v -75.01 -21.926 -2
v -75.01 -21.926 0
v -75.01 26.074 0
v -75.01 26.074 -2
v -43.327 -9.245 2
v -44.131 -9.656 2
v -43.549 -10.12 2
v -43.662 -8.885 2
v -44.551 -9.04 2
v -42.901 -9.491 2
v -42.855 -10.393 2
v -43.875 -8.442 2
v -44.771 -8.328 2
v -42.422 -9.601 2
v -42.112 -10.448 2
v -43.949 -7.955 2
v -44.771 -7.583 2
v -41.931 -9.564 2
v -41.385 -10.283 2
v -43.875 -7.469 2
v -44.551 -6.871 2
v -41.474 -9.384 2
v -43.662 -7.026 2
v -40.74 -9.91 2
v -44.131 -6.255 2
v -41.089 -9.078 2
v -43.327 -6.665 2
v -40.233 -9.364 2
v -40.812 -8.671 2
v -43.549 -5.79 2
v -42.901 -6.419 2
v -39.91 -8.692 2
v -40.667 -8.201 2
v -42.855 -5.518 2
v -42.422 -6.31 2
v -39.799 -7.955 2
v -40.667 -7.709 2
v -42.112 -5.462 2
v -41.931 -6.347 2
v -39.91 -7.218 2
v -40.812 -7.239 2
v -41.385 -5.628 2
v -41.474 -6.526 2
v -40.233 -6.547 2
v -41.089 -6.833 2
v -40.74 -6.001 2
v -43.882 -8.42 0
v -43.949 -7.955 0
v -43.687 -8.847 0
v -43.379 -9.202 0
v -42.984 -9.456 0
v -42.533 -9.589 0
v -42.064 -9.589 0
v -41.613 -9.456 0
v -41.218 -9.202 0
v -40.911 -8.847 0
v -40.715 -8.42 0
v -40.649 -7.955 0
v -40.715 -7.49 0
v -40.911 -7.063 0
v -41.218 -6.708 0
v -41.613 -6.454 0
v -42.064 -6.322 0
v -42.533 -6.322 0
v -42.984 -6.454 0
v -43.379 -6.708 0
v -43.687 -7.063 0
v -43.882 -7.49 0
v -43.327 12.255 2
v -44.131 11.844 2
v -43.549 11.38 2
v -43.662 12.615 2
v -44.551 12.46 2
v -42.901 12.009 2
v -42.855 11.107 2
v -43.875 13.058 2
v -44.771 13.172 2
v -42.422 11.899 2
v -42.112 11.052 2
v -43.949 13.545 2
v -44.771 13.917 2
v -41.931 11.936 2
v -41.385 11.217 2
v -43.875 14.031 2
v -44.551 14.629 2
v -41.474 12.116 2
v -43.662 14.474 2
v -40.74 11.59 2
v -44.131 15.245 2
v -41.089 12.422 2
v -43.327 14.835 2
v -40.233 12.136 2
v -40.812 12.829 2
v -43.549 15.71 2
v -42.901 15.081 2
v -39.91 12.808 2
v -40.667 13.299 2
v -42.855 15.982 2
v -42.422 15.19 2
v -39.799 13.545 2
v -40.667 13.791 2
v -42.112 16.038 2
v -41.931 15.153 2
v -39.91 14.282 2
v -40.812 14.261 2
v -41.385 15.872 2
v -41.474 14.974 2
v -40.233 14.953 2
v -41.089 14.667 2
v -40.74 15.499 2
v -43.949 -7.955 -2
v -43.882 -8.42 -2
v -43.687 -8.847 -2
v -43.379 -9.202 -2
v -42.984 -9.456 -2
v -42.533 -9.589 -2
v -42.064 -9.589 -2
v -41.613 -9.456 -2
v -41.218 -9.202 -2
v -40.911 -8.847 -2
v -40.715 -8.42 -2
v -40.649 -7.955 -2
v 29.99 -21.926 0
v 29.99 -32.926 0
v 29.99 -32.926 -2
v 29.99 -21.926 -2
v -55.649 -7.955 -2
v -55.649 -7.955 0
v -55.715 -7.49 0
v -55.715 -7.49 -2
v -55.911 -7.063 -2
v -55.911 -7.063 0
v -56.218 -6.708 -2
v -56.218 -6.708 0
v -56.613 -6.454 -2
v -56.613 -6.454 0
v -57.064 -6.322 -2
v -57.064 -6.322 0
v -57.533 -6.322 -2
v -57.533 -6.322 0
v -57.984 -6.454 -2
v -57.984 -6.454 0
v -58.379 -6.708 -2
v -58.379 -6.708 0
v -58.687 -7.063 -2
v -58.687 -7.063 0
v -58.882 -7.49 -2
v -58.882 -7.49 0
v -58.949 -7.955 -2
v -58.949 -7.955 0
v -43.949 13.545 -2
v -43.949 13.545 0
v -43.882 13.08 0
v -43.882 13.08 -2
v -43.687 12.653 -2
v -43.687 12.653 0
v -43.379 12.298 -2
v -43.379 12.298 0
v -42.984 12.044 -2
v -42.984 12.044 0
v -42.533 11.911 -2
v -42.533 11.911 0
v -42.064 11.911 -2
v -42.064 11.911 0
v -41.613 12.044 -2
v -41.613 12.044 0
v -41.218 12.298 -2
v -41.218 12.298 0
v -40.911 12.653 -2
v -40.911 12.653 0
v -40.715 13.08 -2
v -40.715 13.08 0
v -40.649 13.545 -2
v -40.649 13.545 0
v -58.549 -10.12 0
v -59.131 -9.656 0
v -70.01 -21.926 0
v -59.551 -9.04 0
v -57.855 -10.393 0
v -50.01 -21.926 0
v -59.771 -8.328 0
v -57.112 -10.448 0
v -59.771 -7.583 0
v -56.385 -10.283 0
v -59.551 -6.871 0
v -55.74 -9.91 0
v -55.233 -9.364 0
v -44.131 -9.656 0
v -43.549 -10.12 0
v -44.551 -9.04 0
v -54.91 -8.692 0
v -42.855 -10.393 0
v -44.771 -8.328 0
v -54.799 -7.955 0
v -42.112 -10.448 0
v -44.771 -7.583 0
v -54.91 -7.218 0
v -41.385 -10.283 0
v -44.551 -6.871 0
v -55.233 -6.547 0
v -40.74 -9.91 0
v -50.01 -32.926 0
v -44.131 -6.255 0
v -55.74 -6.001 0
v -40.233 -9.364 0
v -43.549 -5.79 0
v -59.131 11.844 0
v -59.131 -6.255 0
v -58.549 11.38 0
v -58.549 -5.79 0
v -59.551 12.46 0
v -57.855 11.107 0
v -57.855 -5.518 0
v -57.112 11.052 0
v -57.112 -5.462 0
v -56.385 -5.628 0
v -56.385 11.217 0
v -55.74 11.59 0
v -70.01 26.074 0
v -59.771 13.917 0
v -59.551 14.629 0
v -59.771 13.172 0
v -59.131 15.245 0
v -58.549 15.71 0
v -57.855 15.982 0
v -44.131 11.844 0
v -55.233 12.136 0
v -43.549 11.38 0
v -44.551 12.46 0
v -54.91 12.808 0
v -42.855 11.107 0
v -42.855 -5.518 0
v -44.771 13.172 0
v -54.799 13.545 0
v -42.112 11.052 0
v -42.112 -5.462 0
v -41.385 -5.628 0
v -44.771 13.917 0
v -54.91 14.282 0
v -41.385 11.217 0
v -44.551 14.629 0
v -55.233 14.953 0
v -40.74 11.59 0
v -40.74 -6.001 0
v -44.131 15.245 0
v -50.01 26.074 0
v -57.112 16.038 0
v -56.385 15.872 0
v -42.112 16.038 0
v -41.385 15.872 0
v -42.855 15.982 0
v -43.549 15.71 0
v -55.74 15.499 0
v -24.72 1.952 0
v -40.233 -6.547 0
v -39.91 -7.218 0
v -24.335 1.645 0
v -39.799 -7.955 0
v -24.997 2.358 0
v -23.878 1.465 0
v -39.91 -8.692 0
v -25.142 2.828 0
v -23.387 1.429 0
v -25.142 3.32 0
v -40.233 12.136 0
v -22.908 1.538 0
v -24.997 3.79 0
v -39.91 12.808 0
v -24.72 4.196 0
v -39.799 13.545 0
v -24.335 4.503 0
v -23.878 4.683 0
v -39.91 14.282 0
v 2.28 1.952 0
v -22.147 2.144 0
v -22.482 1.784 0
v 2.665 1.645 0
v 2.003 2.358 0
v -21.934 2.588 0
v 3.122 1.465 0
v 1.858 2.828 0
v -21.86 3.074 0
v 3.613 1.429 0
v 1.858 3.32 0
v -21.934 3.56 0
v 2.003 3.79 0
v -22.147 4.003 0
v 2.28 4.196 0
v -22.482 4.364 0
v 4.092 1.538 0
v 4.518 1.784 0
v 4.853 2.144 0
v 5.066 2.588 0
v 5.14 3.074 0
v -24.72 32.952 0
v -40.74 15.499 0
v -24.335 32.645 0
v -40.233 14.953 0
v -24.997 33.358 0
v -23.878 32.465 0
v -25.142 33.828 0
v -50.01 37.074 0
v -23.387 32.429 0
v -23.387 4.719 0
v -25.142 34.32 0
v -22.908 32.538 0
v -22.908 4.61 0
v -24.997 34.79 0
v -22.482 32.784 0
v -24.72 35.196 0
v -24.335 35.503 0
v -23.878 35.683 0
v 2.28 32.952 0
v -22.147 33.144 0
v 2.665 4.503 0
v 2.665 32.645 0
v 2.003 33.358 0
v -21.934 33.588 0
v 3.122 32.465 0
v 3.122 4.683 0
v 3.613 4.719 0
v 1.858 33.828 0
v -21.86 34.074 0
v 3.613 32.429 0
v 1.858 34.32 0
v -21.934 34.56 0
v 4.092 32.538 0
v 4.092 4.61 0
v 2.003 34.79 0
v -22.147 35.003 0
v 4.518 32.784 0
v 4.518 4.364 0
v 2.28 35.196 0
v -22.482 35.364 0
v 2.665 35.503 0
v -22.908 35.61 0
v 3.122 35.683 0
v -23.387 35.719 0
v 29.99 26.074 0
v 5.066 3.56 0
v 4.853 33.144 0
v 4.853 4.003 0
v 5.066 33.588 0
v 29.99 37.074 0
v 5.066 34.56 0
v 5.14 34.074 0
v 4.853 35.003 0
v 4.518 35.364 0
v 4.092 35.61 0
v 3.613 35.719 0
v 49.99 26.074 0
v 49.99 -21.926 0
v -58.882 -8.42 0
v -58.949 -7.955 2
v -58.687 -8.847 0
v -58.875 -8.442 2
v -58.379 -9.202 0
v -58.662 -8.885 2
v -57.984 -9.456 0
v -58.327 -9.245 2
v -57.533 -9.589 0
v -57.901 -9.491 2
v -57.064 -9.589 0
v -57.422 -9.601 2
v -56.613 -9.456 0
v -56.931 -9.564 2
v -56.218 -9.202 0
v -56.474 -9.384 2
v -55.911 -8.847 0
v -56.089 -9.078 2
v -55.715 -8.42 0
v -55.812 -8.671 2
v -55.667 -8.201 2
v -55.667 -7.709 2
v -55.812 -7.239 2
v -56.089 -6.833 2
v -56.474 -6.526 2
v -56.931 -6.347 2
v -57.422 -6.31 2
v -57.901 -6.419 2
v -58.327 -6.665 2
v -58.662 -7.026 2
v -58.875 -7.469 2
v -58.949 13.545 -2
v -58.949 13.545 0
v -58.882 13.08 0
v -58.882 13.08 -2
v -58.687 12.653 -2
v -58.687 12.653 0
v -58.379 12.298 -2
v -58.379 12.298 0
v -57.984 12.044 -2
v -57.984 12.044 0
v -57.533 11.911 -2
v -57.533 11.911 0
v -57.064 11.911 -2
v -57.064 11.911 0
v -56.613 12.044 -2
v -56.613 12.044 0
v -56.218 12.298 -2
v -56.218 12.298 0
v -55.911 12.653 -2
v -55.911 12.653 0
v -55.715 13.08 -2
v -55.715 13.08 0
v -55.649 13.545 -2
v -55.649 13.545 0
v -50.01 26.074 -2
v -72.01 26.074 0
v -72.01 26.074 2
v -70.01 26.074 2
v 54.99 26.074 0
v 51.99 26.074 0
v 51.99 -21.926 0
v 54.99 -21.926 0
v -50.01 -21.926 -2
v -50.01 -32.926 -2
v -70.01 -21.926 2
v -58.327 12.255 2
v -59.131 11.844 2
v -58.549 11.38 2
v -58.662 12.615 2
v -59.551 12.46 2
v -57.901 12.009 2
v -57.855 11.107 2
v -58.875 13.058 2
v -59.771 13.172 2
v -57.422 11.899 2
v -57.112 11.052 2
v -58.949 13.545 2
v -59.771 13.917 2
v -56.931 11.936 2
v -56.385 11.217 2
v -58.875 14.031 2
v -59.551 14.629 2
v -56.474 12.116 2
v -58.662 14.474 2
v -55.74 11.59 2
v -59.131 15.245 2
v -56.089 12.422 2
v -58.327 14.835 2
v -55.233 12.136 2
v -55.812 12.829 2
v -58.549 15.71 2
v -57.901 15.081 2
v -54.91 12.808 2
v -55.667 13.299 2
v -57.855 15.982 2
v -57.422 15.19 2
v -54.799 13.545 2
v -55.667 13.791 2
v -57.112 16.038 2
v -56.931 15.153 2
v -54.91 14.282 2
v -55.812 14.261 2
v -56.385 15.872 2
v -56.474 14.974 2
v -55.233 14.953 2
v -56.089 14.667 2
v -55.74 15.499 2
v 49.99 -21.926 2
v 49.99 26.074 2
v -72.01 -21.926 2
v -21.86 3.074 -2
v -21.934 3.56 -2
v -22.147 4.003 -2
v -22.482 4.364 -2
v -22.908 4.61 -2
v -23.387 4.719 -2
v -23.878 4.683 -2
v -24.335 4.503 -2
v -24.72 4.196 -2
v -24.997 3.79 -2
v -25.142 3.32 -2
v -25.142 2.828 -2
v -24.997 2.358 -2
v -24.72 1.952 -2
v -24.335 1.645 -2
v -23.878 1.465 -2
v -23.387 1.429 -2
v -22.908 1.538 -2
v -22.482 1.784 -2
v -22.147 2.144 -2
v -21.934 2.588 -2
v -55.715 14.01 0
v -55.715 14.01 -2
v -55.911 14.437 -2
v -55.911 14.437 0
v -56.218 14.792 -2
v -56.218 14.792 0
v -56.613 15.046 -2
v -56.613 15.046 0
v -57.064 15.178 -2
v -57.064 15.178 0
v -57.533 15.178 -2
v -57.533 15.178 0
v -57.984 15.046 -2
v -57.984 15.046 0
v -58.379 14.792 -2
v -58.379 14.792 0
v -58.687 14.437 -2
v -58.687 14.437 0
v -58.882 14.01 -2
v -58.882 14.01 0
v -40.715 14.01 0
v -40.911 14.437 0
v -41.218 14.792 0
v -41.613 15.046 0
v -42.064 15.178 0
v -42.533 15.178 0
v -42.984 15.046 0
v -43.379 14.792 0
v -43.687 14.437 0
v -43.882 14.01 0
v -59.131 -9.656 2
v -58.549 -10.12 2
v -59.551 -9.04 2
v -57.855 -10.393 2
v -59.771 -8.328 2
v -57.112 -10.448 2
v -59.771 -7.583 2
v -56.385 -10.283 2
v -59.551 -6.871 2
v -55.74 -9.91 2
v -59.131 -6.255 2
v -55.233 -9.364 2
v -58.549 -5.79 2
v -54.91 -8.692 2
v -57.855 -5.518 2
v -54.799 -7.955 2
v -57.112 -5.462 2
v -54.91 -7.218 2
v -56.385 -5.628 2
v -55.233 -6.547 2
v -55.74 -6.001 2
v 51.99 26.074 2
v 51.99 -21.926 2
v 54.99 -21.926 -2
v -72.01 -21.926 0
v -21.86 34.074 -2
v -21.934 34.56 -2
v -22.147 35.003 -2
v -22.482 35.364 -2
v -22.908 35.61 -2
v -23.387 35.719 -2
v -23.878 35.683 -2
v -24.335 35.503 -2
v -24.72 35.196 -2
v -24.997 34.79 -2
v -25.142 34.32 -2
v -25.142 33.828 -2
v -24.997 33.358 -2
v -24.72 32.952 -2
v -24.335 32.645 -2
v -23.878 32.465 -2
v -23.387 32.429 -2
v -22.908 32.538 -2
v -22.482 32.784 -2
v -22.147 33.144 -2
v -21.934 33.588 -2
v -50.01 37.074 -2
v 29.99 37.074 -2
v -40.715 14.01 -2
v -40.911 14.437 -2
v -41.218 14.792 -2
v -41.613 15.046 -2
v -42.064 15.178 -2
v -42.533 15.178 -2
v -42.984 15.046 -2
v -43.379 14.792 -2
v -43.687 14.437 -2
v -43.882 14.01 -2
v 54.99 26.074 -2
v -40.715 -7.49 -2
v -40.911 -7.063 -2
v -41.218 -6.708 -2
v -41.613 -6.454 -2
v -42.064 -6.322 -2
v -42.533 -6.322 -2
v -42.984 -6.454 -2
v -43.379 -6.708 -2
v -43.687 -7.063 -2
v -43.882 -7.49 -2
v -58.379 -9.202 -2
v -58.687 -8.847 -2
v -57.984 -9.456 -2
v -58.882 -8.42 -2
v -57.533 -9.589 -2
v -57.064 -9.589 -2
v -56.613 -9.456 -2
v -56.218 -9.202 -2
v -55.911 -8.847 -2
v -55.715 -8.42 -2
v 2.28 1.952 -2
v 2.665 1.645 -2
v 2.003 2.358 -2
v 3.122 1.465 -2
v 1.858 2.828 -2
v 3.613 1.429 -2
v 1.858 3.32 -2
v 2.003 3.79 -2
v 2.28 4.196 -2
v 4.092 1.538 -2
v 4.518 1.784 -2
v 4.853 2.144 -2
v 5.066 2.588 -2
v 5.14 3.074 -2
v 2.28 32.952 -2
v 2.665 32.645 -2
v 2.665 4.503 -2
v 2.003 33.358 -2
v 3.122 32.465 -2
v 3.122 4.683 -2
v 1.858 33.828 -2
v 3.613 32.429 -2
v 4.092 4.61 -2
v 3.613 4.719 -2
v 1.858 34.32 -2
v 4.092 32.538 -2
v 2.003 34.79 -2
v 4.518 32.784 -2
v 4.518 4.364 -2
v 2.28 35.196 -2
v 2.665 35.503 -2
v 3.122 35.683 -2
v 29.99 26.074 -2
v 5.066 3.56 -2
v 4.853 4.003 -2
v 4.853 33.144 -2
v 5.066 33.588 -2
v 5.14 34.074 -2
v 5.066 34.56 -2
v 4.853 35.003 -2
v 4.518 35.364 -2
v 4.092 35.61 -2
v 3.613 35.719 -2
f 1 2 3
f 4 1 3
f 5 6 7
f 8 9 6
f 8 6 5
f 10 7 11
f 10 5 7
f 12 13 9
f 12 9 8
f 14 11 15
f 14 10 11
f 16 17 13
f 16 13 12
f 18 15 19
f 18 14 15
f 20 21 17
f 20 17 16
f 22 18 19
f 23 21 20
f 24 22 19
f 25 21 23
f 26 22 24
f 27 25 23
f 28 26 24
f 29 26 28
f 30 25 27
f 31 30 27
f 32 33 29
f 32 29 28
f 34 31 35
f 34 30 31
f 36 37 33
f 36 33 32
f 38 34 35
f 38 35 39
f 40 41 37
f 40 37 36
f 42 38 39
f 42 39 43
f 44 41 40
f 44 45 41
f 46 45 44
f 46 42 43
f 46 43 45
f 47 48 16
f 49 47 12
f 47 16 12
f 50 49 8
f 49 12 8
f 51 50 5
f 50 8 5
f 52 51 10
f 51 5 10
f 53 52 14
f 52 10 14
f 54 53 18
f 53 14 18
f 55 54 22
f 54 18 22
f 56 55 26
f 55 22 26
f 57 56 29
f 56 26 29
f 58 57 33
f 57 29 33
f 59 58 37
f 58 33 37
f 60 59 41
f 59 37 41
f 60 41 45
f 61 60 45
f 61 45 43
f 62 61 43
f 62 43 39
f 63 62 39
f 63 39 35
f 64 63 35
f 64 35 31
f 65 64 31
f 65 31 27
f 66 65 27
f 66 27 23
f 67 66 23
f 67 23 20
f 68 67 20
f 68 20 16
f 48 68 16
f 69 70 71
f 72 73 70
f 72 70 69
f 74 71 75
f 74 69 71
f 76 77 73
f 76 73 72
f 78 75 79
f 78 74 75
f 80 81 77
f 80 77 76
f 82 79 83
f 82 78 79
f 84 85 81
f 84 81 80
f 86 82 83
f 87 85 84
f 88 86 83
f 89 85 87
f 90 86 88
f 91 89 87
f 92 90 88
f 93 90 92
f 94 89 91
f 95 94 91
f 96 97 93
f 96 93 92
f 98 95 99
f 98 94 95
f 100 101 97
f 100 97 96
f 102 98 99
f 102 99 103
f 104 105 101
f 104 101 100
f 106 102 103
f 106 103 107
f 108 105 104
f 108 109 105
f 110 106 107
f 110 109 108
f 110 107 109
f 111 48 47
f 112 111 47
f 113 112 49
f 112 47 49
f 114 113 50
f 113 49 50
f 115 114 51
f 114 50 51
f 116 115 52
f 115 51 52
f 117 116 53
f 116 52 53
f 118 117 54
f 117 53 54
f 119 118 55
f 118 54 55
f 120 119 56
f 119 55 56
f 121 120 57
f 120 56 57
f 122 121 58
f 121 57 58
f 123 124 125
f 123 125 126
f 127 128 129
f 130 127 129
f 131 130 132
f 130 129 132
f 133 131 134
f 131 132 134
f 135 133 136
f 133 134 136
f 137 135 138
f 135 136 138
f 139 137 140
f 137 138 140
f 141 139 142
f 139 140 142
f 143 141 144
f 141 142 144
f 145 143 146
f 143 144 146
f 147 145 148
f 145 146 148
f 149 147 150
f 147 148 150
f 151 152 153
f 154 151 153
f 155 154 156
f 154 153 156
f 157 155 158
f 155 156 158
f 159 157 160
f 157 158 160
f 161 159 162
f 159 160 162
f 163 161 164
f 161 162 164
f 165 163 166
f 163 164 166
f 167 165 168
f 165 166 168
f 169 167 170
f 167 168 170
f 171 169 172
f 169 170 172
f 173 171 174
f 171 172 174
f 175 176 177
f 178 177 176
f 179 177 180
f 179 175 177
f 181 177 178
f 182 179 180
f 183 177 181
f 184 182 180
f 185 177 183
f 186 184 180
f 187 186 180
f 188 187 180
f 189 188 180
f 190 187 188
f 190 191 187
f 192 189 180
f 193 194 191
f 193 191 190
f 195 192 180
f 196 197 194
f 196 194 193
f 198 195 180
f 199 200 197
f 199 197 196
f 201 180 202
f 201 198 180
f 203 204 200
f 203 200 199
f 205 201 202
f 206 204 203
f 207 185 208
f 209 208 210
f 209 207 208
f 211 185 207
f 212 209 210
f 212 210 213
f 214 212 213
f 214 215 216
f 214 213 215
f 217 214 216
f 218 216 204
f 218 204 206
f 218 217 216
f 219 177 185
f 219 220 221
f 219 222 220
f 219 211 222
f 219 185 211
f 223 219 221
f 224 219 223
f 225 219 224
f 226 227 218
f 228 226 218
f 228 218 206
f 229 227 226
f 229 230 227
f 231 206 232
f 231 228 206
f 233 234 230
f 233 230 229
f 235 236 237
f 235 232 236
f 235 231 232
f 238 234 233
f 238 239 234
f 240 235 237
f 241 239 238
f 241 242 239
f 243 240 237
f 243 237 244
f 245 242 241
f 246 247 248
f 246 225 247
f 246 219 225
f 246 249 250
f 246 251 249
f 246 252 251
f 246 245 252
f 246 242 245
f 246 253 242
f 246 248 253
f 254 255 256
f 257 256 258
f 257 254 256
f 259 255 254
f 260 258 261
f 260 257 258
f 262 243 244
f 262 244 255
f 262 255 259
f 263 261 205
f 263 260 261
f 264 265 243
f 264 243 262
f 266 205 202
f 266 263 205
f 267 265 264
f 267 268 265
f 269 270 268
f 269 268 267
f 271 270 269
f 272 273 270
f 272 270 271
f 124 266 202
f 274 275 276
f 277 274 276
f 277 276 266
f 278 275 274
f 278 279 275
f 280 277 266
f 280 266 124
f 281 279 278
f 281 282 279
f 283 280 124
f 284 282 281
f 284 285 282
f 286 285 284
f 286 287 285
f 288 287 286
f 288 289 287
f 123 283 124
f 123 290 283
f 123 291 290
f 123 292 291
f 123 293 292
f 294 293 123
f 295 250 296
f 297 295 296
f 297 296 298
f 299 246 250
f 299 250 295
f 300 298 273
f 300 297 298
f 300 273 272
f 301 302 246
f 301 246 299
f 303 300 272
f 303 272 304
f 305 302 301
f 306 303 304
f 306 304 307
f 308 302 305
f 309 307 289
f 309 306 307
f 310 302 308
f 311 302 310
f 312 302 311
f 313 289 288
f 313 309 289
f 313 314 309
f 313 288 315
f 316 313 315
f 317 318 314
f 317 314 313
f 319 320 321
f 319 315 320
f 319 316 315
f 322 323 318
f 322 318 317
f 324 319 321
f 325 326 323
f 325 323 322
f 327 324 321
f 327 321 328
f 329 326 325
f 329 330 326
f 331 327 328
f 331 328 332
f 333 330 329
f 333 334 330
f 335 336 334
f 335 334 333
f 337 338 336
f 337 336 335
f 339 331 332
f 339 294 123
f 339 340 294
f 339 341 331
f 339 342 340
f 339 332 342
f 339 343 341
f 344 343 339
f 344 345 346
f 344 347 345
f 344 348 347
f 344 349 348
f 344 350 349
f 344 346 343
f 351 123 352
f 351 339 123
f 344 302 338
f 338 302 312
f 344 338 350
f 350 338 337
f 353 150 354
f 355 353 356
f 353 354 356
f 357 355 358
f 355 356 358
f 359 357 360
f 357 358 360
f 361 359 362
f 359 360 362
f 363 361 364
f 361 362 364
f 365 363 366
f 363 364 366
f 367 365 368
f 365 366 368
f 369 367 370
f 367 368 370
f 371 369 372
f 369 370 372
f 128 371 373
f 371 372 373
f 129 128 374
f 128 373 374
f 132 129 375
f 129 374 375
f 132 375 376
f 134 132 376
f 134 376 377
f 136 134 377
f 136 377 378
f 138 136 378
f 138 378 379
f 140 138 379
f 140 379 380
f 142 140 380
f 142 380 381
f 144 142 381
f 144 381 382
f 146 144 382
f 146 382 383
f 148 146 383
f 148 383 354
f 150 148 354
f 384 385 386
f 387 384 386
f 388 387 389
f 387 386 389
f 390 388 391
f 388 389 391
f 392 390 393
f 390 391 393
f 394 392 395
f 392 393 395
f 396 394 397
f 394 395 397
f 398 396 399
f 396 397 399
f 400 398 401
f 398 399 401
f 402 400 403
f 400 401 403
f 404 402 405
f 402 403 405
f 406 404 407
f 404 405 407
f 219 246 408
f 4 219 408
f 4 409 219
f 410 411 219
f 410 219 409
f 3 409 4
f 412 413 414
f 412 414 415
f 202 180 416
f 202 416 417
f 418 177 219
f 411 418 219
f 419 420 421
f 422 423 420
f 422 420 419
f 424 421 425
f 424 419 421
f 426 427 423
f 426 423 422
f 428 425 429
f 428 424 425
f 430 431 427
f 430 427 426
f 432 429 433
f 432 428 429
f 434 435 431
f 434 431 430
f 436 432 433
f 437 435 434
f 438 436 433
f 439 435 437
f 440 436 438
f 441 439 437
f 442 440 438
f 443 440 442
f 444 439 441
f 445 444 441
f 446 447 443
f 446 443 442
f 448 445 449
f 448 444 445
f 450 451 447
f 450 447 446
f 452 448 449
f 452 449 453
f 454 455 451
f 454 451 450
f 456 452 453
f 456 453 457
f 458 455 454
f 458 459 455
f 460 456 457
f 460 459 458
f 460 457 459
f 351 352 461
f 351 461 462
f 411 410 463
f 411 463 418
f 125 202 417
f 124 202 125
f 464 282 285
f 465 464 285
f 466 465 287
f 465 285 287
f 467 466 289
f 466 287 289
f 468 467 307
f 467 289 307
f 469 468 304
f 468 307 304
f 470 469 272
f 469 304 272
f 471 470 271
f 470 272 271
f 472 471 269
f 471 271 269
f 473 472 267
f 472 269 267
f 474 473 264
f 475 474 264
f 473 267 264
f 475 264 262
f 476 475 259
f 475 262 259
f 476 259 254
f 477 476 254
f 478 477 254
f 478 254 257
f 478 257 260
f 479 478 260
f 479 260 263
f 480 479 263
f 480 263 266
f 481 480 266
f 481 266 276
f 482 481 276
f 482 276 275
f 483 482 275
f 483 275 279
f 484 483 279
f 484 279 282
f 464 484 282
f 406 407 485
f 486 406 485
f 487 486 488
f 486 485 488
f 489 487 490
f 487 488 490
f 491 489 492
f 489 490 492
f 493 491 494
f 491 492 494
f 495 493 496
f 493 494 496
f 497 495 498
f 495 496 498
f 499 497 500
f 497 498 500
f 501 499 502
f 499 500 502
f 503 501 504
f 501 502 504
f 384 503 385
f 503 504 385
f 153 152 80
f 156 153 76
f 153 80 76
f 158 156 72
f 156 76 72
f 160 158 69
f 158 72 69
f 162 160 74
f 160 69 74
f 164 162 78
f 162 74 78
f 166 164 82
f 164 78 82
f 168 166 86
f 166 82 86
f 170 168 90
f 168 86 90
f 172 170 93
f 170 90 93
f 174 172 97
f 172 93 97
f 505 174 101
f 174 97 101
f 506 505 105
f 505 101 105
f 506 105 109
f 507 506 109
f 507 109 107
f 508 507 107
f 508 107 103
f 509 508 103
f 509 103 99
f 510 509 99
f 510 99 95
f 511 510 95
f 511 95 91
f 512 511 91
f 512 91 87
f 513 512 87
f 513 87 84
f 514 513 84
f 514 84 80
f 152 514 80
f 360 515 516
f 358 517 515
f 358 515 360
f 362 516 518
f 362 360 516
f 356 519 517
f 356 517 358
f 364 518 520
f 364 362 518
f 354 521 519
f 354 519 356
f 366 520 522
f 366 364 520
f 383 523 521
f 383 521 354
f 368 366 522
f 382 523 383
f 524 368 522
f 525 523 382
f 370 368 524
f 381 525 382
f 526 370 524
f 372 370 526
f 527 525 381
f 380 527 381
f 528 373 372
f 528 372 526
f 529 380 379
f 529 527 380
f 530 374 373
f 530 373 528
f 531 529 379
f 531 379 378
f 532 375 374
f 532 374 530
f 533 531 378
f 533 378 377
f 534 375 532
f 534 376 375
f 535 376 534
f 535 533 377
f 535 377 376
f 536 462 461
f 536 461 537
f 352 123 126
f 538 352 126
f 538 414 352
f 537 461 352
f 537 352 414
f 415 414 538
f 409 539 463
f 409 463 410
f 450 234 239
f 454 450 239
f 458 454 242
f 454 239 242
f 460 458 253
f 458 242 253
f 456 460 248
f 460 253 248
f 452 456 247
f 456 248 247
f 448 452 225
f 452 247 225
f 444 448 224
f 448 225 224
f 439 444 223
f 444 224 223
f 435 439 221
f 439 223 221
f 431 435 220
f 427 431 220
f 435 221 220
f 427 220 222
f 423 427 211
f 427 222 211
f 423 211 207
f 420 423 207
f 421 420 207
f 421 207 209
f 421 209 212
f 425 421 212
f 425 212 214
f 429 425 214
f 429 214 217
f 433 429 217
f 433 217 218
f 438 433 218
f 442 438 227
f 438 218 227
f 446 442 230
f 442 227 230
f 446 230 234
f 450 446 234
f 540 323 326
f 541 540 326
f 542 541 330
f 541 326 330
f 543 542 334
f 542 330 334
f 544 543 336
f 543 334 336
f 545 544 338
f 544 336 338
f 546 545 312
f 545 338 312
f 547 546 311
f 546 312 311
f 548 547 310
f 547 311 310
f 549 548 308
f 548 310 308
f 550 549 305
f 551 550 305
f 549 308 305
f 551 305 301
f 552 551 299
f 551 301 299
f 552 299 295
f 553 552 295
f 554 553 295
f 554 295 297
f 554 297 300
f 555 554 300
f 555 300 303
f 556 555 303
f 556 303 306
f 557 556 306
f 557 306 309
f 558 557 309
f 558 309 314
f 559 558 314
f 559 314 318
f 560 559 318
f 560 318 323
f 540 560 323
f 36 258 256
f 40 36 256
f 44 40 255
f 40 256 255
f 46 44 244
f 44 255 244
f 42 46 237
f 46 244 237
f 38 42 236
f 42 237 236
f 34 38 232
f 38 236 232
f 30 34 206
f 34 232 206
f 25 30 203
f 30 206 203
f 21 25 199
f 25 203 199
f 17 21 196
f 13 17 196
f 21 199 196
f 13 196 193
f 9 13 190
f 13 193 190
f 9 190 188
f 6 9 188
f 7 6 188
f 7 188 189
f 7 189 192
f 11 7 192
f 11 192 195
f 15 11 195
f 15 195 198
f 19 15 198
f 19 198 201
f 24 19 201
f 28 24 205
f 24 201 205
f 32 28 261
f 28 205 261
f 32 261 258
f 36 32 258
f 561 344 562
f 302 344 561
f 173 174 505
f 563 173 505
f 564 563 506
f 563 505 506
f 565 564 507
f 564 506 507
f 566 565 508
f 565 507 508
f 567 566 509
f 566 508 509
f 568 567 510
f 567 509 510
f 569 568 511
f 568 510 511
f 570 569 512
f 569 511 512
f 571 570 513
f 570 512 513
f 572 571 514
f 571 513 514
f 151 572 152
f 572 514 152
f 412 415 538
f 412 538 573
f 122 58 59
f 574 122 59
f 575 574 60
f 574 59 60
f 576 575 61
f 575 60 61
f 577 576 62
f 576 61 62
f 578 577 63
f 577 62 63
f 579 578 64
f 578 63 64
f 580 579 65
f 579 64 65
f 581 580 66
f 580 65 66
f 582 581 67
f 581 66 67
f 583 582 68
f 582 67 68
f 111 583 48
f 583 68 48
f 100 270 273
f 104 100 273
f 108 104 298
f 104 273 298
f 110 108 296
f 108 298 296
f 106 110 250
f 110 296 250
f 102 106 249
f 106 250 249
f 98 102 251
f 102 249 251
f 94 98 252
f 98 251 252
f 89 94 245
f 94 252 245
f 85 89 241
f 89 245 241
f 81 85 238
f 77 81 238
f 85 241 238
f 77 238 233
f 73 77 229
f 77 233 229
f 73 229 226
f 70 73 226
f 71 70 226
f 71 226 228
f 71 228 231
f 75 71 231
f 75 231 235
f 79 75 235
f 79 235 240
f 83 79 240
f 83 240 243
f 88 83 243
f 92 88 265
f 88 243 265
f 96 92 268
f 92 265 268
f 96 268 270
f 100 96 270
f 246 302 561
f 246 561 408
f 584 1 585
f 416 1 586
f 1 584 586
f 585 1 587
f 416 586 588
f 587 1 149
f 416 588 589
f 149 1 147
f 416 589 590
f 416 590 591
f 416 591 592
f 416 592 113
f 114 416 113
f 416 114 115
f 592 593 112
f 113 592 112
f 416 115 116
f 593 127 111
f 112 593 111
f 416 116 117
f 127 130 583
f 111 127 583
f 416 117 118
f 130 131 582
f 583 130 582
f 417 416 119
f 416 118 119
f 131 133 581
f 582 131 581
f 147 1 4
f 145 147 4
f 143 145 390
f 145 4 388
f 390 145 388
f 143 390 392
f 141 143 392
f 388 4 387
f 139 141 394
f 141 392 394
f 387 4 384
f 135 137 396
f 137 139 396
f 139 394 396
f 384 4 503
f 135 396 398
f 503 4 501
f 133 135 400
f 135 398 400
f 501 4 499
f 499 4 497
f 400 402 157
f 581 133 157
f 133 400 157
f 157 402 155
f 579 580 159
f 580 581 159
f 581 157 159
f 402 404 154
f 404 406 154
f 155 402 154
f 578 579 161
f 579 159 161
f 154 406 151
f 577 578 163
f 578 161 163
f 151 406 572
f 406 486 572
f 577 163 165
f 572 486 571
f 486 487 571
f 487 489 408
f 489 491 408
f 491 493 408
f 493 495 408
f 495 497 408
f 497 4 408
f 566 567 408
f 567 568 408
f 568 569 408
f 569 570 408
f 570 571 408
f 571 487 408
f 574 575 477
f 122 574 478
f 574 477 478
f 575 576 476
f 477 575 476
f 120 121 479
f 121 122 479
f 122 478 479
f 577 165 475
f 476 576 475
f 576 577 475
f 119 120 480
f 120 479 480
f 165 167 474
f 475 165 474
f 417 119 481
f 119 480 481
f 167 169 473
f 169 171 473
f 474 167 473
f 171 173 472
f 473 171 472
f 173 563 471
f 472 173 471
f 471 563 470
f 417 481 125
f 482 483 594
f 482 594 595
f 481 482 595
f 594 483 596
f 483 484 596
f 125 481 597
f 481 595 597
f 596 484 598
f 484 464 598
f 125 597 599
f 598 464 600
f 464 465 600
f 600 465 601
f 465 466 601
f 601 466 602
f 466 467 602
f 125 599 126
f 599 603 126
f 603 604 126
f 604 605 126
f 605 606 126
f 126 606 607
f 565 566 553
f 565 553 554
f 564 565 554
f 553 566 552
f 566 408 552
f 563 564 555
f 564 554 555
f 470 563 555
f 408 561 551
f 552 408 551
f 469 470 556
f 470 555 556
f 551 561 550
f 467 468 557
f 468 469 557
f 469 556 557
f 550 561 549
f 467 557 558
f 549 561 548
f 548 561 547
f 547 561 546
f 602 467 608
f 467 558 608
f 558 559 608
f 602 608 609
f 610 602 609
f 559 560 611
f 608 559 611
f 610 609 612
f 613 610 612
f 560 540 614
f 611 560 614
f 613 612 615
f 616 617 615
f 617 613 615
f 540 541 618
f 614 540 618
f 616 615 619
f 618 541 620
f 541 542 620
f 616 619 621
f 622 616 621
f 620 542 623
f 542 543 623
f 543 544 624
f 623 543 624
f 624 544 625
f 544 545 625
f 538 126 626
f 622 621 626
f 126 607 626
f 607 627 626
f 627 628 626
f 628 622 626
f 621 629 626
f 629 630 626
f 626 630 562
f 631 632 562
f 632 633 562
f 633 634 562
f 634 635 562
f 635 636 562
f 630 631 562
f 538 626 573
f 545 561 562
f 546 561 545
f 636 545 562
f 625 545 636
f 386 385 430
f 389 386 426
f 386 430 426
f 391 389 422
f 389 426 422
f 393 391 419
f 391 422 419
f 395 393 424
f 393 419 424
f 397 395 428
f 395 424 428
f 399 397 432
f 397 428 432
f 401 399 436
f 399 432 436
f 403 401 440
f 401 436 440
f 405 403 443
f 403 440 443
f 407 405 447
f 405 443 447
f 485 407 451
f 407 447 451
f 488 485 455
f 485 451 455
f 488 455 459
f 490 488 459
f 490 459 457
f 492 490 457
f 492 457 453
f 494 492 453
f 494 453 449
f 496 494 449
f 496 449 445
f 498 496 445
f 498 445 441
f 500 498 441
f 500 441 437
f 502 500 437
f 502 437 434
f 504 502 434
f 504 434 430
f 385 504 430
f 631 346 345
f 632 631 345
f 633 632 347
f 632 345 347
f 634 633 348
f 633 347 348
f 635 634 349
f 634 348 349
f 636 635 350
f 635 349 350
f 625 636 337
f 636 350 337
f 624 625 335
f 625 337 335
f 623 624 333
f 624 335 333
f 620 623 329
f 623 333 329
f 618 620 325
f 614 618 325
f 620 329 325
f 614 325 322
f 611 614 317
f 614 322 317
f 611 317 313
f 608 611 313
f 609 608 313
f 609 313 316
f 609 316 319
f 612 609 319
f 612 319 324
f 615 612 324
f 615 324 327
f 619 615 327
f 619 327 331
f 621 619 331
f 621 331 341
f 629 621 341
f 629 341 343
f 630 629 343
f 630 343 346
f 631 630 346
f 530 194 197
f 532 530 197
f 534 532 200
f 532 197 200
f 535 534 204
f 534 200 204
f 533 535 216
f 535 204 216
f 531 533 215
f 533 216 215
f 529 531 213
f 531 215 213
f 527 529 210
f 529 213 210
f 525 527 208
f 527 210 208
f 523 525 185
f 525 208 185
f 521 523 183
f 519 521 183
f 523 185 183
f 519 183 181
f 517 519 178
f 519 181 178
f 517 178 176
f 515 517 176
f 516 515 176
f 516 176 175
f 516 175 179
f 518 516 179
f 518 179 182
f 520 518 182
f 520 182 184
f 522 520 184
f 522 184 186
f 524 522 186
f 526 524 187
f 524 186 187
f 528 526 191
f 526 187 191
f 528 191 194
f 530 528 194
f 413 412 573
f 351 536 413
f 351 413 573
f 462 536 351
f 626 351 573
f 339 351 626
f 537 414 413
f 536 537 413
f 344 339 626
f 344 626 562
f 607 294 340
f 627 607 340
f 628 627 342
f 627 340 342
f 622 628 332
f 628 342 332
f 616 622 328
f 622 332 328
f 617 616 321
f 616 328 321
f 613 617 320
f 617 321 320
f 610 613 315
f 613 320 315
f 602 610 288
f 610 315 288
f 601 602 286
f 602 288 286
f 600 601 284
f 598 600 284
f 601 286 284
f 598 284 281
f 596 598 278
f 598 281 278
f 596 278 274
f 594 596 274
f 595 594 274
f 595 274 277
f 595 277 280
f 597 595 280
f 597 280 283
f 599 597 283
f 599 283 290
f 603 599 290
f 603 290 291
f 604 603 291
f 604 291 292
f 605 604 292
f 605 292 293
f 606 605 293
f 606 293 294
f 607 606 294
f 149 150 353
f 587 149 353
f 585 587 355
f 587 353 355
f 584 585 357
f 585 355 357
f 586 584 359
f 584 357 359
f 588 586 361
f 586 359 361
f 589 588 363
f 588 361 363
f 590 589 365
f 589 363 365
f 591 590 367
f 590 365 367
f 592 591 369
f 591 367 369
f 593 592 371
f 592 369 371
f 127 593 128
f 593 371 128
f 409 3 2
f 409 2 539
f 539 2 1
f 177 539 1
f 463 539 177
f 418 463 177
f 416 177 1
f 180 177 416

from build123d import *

# Parameters (mm, degrees)
F0_R     = 2.5
F0_W     = 20
F0_H     = 48
F0_W_2   = 3
F0_W_3   = 2
F1_DEPTH = 2
F2_DEPTH = 2
F3_D     = 3.3
F3_DEPTH = 2.001
F4_D     = 3.3


# Not quite as in the source:
# - a feature names something its author has since deleted; it is built from what else it names


with BuildPart() as f1:
    # F0 (on Top) → F1 (new body)
    with BuildSketch(Plane.XY):
        Polygon((-17.7864517868, 26.073888598), (-50.0104304813, 26.073888598), (-50.0104304813, -21.926111402), (-17.7864517868, -21.926111402), (19.2135482132, -21.926111402), (29.9895695187, -21.926111402), (29.9895695187, 26.073888598), (19.2135482132, 26.073888598), align=None)
        with Locations((-42.2986224294, -7.9553306252)):
            Circle(F0_R, mode=Mode.SUBTRACT)
        with Locations((-42.2986224294, 13.5446693748)):
            Circle(F0_R, mode=Mode.SUBTRACT)
        Polygon((-50.0104304813, -21.926111402), (-50.0104304813, 26.073888598), (-54.2864517868, 26.073888598), (-70.0104304813, 26.073888598), (-70.0104304813, -21.926111402), (-54.2864517868, -21.926111402), align=None)
        with Locations((-57.2986224294, -7.9553306252)):
            Circle(F0_R, mode=Mode.SUBTRACT)
        with Locations((-57.2986224294, 13.5446693748)):
            Circle(F0_R, mode=Mode.SUBTRACT)
        with Locations((39.9895695187, 2.073888598)):
            Rectangle(F0_W, F0_H)
        Polygon((29.9895695187, 37.073888598), (-50.0104304813, 37.073888598), (-50.0104304813, 26.073888598), (-17.7864517868, 26.073888598), (19.2135482132, 26.073888598), (29.9895695187, 26.073888598), align=None)
        Polygon((-17.7864517868, -21.926111402), (-50.0104304813, -21.926111402), (-50.0104304813, -32.926111402), (29.9895695187, -32.926111402), (29.9895695187, -21.926111402), (19.2135482132, -21.926111402), align=None)
        with Locations((-73.5104304813, 2.073888598)):
            Rectangle(F0_W_2, F0_H)
        with Locations((53.4895695187, 2.073888598)):
            Rectangle(F0_W_2, F0_H)
        with Locations((-71.0104304813, 2.073888598)):
            Rectangle(F0_W_3, F0_H)
        with Locations((50.9895695187, 2.073888598)):
            Rectangle(F0_W_3, F0_H)
        with Locations((-42.2986224294, 13.5446693748)):
            Circle(F0_R)
        with Locations((-42.2986224294, -7.9553306252)):
            Circle(F0_R)
        with Locations((-57.2986224294, -7.9553306252)):
            Circle(F0_R)
        with Locations((-57.2986224294, 13.5446693748)):
            Circle(F0_R)
    extrude(amount=-F1_DEPTH)

    # F0 (on Top) → F2 (join)
    with BuildSketch(Plane.XY):
        with Locations((-71.0104304813, 2.073888598)):
            Rectangle(F0_W_3, F0_H)
        with Locations((50.9895695187, 2.073888598)):
            Rectangle(F0_W_3, F0_H)
        with Locations((-57.2986224294, 13.5446693748)):
            Circle(F0_R)
        with Locations((-42.2986224294, 13.5446693748)):
            Circle(F0_R)
        with Locations((-42.2986224294, -7.9553306252)):
            Circle(F0_R)
        with Locations((-57.2986224294, -7.9553306252)):
            Circle(F0_R)
    extrude(amount=F2_DEPTH)

    # F3 (through all, one way)
    with BuildSketch(Plane.XY):
        with Locations((-23.5104304813, 3.073888598), (3.4895695187, 3.073888598), (3.4895695187, 34.073888598), (-23.5104304813, 34.073888598), (-57.2986224294, 13.5446693748), (-42.2986224294, 13.5446693748), (-42.2986224294, -7.9553306252), (-57.2986224294, -7.9553306252)):
            Circle(F3_D / 2)
    extrude(amount=-F3_DEPTH, mode=Mode.SUBTRACT)

    # F4 (through all)
    with Locations(Plane(origin=(0, 0, 0), x_dir=(1, 0, 0), z_dir=(0, 0, -1))):
        with Locations((-57.2986224294, -13.5446693748), (-57.2986224294, 7.9553306252), (-42.2986224294, -13.5446693748), (-42.2986224294, 7.9553306252)):
            Hole(F4_D / 2)


solid = f1.part
